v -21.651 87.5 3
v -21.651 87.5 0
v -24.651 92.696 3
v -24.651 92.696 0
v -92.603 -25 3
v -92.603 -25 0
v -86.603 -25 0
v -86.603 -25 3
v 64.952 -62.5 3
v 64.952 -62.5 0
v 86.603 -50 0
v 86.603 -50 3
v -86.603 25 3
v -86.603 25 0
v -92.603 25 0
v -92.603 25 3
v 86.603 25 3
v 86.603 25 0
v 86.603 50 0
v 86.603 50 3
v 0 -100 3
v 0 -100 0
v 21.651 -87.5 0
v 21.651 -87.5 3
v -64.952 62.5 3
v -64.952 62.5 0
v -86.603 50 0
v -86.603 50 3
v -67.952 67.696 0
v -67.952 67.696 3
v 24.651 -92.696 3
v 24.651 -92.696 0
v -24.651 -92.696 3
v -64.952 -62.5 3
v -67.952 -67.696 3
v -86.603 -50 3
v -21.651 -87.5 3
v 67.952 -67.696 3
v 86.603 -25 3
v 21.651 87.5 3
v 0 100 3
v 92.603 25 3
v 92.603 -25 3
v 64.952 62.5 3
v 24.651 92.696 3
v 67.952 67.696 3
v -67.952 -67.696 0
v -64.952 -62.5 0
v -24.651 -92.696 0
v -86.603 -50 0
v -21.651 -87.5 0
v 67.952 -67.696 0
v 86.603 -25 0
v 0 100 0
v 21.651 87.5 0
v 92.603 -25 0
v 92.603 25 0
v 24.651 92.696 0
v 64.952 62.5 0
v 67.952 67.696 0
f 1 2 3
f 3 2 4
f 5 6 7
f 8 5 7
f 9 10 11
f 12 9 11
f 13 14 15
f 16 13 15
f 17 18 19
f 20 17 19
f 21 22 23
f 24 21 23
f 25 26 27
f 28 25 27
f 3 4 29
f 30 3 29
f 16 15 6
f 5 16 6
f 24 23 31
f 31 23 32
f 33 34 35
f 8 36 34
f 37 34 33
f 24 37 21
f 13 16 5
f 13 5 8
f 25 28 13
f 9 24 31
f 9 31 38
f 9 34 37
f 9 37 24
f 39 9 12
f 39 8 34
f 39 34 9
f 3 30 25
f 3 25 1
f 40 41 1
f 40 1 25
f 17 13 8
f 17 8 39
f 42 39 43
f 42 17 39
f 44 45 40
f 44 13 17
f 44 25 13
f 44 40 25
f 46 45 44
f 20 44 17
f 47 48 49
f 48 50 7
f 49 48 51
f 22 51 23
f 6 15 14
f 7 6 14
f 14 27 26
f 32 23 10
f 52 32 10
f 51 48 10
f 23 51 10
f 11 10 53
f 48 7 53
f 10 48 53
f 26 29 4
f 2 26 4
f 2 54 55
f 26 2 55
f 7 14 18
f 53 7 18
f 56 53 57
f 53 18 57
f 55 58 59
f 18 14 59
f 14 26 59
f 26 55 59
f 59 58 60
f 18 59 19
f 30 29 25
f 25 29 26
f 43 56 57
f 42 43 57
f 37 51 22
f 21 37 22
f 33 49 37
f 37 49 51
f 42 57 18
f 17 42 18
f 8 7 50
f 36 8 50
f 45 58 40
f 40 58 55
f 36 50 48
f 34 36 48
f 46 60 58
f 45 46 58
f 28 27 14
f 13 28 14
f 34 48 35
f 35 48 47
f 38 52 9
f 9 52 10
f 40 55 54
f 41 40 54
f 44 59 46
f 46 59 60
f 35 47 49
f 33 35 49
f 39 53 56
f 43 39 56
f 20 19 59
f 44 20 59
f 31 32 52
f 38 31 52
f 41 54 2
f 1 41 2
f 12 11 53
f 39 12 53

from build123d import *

# Parameters (mm, degrees)
F1_DEPTH = 3


with BuildPart() as f1:
    # F0 (on Top) → F1 (new body)
    with BuildSketch(Plane.XY):
        Polygon((-21.650635, -87.5), (0, -100), (21.650635, -87.5), (24.650635, -92.696152), (67.951905, -67.696152), (64.951905, -62.5), (86.60254, -50), (86.60254, -25), (92.60254, -25), (92.60254, 25), (86.60254, 25), (86.60254, 50), (64.951905, 62.5), (67.951905, 67.696152), (24.650635, 92.696152), (21.650635, 87.5), (0, 100), (-21.650635, 87.5), (-24.650635, 92.696152), (-67.951905, 67.696152), (-64.951905, 62.5), (-86.60254, 50), (-86.60254, 25), (-92.60254, 25), (-92.60254, -25), (-86.60254, -25), (-86.60254, -50), (-64.951905, -62.5), (-67.951905, -67.696152), (-24.650635, -92.696152), align=None)
    extrude(amount=F1_DEPTH)


solid = f1.part
